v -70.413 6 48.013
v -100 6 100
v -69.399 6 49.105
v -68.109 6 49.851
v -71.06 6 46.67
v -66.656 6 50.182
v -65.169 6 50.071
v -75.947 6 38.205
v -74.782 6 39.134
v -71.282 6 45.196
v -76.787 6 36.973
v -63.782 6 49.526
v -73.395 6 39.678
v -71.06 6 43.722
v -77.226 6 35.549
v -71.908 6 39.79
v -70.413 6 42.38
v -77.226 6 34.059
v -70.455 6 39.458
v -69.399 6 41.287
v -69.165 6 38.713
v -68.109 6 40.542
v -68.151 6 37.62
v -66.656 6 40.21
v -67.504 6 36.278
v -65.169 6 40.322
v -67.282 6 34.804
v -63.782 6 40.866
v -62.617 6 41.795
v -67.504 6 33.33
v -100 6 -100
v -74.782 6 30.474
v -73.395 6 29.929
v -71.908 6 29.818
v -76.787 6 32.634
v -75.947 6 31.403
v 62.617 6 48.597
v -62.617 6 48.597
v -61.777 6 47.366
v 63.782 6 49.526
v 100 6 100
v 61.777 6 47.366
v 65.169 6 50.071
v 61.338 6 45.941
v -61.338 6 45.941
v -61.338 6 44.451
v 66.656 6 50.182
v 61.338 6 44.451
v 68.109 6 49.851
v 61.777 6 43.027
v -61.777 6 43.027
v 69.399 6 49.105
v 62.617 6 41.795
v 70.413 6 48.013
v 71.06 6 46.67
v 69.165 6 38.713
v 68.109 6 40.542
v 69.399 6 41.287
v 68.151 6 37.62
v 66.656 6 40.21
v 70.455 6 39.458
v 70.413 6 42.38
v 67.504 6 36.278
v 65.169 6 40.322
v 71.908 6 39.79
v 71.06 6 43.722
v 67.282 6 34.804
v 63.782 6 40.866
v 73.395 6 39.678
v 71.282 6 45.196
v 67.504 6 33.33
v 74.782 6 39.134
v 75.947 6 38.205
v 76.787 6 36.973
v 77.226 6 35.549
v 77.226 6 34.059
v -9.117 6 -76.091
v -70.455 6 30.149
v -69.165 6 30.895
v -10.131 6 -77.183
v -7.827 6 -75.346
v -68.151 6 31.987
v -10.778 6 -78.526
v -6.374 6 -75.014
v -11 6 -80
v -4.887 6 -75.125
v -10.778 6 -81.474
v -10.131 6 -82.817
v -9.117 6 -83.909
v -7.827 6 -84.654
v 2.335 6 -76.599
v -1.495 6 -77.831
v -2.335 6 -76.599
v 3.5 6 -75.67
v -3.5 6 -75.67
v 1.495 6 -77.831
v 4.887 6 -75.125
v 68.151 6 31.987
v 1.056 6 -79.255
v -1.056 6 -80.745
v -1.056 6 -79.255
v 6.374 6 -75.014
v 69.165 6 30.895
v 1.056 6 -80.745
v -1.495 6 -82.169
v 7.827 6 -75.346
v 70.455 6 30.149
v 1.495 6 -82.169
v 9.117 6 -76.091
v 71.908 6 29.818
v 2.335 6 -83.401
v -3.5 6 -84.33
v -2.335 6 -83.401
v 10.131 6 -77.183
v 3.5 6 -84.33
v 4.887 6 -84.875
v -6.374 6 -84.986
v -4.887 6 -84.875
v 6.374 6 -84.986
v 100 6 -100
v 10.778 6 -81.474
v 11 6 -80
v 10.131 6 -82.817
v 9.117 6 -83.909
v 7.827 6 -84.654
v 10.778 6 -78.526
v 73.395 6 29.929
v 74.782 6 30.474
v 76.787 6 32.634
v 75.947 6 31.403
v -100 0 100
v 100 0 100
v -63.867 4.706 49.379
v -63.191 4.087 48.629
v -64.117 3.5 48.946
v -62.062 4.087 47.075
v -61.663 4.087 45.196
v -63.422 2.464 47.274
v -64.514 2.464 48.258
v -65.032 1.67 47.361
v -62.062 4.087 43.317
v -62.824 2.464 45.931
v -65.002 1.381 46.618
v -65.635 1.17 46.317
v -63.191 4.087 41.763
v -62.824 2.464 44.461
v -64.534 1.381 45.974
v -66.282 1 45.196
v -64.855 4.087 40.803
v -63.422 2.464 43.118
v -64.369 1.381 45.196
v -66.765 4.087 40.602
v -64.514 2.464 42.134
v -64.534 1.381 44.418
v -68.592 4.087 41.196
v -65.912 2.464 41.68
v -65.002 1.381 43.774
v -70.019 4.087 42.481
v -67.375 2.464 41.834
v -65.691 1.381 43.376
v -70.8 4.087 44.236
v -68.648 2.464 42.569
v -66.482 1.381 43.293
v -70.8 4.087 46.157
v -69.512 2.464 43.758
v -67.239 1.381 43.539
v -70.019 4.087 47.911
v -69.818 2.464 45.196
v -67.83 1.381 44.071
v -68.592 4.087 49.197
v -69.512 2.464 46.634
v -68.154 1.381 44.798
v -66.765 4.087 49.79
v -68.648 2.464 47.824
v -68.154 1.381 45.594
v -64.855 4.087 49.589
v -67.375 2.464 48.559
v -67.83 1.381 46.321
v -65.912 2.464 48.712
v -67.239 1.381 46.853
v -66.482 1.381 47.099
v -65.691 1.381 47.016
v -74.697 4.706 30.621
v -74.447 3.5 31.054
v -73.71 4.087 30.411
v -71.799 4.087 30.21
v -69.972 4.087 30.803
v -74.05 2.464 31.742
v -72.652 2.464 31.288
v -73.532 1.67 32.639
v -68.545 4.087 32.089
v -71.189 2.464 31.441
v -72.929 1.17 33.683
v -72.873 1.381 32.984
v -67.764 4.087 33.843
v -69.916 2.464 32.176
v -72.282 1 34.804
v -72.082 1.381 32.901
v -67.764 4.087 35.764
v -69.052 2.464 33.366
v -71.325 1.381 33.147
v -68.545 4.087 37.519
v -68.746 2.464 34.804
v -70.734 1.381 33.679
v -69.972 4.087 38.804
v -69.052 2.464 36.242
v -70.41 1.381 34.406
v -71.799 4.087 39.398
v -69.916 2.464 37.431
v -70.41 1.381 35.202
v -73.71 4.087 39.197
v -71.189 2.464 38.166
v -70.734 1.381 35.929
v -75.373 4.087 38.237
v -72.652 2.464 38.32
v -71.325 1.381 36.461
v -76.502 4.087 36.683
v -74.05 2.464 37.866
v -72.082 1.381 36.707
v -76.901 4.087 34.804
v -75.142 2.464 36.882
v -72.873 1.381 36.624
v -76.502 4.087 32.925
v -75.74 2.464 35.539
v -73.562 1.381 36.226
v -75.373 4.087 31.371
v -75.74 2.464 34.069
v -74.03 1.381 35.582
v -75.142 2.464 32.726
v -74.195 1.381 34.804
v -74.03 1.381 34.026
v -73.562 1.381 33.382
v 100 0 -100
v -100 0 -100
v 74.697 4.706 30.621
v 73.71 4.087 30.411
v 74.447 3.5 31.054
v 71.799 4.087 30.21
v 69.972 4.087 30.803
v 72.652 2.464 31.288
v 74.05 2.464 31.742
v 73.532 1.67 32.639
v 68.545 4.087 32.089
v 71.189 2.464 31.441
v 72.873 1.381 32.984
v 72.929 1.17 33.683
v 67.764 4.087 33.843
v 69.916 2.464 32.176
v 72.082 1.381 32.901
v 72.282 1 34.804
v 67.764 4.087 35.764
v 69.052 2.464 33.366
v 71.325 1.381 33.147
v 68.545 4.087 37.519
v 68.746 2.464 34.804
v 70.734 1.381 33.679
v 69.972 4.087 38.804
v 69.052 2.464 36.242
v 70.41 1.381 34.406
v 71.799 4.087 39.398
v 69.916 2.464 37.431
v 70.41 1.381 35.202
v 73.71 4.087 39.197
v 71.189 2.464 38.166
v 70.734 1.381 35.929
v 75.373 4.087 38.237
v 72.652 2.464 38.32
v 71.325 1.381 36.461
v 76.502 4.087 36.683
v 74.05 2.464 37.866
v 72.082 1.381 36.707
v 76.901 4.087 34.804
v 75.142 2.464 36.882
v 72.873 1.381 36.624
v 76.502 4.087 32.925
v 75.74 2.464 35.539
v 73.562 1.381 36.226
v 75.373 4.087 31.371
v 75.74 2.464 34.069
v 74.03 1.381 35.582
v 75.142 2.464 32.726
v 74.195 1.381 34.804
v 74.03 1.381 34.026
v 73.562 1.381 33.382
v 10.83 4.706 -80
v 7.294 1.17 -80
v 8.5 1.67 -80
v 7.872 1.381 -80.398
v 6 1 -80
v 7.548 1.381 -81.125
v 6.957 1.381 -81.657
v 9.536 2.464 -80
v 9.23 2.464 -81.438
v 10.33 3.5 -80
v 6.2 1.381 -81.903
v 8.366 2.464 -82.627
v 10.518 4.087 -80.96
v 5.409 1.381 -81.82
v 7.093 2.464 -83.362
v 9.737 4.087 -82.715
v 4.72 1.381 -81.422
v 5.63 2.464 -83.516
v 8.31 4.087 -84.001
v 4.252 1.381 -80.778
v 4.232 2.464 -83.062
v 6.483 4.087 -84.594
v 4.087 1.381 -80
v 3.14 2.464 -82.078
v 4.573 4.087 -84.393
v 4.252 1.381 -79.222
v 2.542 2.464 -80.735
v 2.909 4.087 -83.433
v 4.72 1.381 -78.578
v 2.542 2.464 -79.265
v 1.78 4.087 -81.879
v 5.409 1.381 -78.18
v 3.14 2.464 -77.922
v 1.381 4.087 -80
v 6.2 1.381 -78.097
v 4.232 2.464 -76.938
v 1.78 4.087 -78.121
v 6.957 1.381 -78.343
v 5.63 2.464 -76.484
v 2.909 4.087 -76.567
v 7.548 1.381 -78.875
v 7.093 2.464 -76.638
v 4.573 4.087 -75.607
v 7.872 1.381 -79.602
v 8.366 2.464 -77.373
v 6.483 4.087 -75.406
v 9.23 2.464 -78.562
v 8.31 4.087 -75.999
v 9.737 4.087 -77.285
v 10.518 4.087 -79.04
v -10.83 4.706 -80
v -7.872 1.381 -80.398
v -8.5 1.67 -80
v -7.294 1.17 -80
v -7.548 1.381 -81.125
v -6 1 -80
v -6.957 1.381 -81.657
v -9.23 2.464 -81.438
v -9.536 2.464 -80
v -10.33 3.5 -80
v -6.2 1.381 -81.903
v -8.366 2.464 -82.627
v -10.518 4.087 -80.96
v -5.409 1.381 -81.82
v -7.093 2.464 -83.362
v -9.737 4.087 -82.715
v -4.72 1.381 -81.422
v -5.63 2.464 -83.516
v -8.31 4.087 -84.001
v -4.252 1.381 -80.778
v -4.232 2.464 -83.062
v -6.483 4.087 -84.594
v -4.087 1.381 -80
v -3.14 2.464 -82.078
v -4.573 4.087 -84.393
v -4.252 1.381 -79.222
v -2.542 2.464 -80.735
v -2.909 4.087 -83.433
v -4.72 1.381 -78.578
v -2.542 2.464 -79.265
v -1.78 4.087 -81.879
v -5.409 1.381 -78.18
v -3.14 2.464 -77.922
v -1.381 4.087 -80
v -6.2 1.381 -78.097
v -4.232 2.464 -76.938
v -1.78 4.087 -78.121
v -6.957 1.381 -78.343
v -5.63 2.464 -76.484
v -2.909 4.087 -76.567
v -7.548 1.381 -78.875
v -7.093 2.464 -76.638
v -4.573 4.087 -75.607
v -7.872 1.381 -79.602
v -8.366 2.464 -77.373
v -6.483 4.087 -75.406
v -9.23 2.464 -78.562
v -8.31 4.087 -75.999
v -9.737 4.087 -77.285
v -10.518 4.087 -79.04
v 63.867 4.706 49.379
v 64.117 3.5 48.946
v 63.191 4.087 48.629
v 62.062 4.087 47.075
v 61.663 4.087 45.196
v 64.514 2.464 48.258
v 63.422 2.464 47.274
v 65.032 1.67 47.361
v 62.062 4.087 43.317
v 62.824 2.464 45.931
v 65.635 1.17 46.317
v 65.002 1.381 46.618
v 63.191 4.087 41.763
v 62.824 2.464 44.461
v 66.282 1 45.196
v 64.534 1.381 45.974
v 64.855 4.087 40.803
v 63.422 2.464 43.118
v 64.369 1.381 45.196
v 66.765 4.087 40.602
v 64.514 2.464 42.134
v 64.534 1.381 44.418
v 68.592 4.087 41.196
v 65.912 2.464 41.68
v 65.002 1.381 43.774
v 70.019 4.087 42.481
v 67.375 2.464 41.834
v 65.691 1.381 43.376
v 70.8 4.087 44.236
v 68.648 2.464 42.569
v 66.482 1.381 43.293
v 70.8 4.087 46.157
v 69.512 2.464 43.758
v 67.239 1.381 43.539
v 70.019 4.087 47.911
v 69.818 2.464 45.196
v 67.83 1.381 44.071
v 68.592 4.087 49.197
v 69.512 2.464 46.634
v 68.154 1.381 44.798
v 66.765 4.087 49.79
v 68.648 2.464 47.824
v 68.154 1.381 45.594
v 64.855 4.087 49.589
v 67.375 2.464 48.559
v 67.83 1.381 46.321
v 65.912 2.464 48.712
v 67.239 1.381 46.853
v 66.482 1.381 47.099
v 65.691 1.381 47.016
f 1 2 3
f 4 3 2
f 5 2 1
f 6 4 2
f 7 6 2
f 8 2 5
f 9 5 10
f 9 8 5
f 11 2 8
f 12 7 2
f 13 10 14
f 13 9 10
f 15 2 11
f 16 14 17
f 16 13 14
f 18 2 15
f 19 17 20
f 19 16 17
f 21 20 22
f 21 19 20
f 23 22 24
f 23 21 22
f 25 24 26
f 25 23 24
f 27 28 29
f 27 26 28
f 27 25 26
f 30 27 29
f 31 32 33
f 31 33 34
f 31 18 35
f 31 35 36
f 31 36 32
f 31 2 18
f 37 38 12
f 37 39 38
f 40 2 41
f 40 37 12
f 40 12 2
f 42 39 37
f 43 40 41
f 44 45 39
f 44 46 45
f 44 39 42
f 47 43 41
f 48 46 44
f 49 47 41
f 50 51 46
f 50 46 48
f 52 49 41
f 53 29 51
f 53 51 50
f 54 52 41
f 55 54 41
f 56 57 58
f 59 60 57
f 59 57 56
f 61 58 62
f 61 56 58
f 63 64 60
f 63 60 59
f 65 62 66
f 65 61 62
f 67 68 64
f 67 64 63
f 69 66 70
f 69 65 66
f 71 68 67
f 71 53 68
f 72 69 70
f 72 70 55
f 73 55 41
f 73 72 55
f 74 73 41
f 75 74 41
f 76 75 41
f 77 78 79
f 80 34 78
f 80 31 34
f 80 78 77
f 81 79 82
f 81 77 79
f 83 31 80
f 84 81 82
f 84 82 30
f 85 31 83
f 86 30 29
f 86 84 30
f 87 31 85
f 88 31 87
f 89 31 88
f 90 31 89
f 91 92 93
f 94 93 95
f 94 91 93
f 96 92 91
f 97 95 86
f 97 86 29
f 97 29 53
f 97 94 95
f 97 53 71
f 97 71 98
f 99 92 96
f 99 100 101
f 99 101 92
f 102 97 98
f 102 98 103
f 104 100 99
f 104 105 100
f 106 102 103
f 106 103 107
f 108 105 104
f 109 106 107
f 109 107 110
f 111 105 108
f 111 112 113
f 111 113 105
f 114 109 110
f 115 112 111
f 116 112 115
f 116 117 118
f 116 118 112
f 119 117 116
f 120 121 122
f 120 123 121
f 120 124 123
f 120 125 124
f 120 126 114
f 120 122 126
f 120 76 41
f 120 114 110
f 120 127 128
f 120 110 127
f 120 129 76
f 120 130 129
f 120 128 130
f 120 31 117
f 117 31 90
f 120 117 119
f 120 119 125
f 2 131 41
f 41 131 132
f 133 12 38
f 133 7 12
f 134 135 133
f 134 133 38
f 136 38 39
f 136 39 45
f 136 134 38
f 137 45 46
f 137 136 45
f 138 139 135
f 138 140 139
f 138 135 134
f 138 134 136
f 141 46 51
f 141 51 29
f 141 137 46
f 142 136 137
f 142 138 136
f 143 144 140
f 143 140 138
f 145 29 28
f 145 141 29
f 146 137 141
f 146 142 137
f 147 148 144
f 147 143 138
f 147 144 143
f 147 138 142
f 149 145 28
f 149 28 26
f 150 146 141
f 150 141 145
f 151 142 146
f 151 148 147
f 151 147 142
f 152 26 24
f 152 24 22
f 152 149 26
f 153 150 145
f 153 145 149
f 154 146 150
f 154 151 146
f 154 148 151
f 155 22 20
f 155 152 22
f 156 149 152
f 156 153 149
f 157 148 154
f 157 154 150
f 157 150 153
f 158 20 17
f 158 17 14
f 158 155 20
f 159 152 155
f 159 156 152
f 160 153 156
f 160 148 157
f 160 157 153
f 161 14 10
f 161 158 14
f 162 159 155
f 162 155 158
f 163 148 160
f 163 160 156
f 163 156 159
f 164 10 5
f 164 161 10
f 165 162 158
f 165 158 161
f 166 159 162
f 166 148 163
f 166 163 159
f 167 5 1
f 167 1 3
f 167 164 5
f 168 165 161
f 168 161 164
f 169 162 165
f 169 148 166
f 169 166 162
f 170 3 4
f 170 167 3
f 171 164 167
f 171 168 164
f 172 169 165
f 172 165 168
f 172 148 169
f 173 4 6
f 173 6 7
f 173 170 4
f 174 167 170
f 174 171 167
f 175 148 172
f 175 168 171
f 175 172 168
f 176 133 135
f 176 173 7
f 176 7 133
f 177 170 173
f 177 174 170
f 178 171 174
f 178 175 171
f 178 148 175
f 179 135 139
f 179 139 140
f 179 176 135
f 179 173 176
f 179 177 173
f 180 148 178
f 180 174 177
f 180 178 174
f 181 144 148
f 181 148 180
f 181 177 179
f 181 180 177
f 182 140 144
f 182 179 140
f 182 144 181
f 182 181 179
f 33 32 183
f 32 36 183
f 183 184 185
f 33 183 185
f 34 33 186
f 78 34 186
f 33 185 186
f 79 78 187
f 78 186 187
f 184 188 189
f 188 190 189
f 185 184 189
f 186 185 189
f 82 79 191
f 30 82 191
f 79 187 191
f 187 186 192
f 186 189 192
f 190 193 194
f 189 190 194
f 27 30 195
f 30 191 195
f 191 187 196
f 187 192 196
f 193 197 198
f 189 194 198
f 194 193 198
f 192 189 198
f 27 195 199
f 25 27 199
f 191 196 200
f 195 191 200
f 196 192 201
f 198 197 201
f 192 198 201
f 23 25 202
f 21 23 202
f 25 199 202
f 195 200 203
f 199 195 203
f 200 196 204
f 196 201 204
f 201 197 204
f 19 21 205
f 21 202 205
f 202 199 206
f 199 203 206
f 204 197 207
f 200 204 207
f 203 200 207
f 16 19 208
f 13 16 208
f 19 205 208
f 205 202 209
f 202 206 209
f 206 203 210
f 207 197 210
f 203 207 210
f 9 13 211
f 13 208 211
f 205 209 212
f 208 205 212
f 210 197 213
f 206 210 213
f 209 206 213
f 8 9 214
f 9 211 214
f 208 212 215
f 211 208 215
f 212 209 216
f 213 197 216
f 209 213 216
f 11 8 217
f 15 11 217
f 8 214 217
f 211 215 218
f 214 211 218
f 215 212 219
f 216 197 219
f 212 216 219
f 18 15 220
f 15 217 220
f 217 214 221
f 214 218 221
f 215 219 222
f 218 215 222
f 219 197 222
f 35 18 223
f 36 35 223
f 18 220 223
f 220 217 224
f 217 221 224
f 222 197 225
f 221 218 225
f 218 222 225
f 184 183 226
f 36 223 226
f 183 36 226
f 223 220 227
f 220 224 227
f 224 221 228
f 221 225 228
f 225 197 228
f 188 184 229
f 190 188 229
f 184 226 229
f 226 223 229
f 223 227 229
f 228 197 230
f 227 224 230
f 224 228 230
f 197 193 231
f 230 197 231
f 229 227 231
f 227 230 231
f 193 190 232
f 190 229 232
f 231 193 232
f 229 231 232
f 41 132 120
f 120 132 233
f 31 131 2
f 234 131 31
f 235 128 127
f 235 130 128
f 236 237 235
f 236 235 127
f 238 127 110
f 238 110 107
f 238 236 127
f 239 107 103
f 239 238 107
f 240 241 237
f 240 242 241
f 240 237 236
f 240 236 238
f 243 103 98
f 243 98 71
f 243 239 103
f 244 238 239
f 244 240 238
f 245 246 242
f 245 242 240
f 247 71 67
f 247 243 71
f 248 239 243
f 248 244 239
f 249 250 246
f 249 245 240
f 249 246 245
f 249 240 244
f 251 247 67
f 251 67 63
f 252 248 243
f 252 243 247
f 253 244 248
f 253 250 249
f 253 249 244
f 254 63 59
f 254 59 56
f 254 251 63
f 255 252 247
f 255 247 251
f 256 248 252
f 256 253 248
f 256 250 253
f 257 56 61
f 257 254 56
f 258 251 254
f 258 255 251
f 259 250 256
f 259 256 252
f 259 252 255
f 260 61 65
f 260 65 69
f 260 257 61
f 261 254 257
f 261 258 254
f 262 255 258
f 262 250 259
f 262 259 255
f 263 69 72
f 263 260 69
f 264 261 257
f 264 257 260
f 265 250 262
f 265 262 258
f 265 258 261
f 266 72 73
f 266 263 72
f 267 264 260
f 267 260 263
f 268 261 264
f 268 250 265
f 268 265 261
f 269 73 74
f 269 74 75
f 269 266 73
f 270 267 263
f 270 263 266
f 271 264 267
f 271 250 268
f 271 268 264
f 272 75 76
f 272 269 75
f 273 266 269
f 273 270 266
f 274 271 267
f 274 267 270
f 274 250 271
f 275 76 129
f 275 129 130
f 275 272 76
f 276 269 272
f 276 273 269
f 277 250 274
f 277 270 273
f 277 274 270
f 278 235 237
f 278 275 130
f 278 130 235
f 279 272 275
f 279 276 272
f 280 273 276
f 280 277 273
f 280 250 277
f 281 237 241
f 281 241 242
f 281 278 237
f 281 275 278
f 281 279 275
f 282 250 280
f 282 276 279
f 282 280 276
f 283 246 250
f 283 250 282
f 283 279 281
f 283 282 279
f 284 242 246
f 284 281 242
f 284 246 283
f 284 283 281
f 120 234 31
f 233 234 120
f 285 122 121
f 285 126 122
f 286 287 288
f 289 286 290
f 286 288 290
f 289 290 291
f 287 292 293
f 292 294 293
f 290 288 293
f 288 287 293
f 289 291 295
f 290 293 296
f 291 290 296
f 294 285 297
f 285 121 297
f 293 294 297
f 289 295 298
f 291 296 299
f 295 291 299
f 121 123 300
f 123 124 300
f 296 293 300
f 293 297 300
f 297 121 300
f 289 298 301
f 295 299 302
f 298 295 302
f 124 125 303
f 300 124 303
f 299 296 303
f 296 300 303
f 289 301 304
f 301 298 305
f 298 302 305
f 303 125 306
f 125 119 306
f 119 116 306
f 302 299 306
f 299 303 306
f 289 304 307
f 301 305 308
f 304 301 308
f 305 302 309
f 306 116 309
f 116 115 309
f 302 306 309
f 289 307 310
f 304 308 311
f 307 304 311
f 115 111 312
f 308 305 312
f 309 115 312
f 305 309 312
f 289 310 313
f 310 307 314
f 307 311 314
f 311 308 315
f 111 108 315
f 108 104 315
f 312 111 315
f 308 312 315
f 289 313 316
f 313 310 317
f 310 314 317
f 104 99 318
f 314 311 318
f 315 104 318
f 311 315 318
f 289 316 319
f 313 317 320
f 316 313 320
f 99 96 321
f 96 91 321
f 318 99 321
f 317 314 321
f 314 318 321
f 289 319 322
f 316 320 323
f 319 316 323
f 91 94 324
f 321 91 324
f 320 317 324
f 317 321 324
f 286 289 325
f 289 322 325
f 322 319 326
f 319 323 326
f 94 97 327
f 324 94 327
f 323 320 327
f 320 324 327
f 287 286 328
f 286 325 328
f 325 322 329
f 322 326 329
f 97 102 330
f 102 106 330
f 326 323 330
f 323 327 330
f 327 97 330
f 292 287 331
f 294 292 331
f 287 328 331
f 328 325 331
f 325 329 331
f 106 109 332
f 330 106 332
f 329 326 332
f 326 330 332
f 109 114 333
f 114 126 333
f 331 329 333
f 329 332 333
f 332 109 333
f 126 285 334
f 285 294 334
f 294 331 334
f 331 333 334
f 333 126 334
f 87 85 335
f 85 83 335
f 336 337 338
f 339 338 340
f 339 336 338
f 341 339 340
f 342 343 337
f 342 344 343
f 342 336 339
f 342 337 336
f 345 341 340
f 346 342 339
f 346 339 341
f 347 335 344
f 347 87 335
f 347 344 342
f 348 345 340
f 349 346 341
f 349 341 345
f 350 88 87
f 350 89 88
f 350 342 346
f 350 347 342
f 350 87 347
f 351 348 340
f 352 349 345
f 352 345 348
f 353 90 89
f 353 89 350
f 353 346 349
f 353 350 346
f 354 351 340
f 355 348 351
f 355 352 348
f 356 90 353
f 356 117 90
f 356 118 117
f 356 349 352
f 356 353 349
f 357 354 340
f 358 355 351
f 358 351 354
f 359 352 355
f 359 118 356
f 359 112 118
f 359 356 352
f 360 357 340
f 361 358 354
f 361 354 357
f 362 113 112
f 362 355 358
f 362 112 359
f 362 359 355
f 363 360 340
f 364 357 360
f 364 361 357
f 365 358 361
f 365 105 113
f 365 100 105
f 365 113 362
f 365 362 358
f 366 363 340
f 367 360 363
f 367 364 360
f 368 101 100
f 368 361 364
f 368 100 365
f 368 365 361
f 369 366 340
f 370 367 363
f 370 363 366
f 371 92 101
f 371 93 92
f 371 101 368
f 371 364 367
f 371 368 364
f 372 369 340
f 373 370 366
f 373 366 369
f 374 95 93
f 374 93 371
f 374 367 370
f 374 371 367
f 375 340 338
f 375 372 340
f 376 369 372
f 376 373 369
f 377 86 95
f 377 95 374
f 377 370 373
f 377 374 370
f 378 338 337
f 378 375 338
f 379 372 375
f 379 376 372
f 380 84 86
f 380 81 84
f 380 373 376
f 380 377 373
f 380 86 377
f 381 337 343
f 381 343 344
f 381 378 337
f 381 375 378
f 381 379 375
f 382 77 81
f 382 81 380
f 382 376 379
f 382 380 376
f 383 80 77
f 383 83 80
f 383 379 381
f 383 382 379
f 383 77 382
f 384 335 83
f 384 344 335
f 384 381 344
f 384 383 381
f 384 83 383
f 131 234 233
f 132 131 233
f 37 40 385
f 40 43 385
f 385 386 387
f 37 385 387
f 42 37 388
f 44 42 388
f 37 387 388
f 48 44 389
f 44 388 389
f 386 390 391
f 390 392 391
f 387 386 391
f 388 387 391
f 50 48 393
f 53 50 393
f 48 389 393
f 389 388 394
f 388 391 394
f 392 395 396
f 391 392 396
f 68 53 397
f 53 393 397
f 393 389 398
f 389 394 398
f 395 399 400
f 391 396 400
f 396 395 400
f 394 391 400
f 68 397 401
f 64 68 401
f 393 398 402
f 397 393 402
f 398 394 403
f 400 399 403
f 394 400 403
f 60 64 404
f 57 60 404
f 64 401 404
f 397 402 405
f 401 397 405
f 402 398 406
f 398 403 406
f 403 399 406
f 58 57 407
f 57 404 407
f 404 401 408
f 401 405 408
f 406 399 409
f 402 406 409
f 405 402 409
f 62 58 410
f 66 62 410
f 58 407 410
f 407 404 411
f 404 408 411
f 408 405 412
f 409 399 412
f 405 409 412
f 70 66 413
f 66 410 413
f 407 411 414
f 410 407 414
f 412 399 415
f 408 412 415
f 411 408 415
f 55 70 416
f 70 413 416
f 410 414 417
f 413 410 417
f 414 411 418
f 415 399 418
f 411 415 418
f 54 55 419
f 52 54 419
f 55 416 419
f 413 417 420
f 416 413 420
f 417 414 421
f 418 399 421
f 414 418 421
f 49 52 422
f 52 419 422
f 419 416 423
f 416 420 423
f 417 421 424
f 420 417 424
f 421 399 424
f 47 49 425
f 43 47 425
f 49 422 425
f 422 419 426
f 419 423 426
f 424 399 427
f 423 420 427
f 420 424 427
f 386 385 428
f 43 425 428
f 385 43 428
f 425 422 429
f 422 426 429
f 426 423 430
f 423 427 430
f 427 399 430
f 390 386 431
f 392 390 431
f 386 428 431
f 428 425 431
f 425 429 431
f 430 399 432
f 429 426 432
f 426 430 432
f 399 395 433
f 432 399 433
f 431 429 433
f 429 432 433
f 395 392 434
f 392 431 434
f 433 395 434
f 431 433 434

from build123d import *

# Parameters (mm, degrees)
SKETCH1_W           = 200
SKETCH1_H           = 200
BOSS_EXTRUDE1_DEPTH = 6


with BuildPart() as part:
    # Sketch1 → Boss-Extrude1 (new body)
    with BuildSketch(Plane(origin=(0, 0, 0), x_dir=(1, 0, 0), z_dir=(0, 1, 0))):
        Rectangle(SKETCH1_W, SKETCH1_H)
    extrude(amount=BOSS_EXTRUDE1_DEPTH)

    # Sketch2 → Cut-Revolve1 (revolve, cut)
    with BuildSketch(Plane.XY.offset(-80)):
        with BuildLine():
            Line((-11, 6), (-6, 6))
            Line((-6, 6), (-6, 1))
            ThreePointArc((-6, 1), (-9.535533906, 2.464466094), (-11, 6))
        make_face()
    cut_revolve1 = revolve(axis=Axis((-6, 6, -80), (0, -1, 0)), mode=Mode.SUBTRACT)

    # Sketch4 → Cut-Revolve2 (revolve, cut)
    with BuildSketch(Plane(origin=(-69.282032303, 0, 40), x_dir=(0, -1, 0), z_dir=(-0.8660254037844398, 0, 0.499999999999998))):
        with BuildLine():
            Line((-1, 6), (-6, 6))
            Line((-6, 6), (-6, 11))
            ThreePointArc((-6, 11), (-2.464466094, 9.535533906), (-1, 6))
        make_face()
    cut_revolve2 = revolve(axis=Axis((-66.282032303, 1, 45.196152423), (0, 1, 0)), mode=Mode.SUBTRACT)

    # Mirror1: Cut-Revolve2 across plane
    add(cut_revolve2.mirror(Plane(origin=(0, 0, 0), x_dir=(-0.8660254037844398, 0, 0.499999999999998), z_dir=(-0.499999999999998, 0, -0.8660254037844398))), mode=Mode.SUBTRACT)

    # Mirror2: Cut-Revolve1 across plane
    add(cut_revolve1.mirror(Plane(origin=(0, 0, 0), x_dir=(0, 0, 1), z_dir=(1, 0, 0))), mode=Mode.SUBTRACT)

    # Mirror2 copy 1 sketch → Mirror2 copy 1 (revolve, cut)
    with BuildSketch(Plane(origin=(69.282032303, 0, 40), x_dir=(0, -1, 0), z_dir=(0.8660254037844398, 0, 0.499999999999998))):
        with BuildLine():
            Line((-1, 6), (-6, 6))
            Line((-6, 6), (-6, 11))
            ThreePointArc((-6, 11), (-2.464466094, 9.535533906), (-1, 6))
        make_face()
    revolve(axis=Axis((72.282032303, 1, 34.803847577), (0, 1, 0)), mode=Mode.SUBTRACT)

    # Mirror2 copy 2 sketch → Mirror2 copy 2 (revolve, cut)
    with BuildSketch(Plane(origin=(69.282032303, 0, 40), x_dir=(0, -1, 0), z_dir=(0.8660254037844398, 0, 0.499999999999998))):
        with BuildLine():
            Line((-1, -6), (-6, -6))
            Line((-6, -6), (-6, -11))
            ThreePointArc((-6, -11), (-2.464466094, -9.535533906), (-1, -6))
        make_face()
    revolve(axis=Axis((66.282032303, 1, 45.196152423), (0, -1, 0)), mode=Mode.SUBTRACT)


solid = part.part
